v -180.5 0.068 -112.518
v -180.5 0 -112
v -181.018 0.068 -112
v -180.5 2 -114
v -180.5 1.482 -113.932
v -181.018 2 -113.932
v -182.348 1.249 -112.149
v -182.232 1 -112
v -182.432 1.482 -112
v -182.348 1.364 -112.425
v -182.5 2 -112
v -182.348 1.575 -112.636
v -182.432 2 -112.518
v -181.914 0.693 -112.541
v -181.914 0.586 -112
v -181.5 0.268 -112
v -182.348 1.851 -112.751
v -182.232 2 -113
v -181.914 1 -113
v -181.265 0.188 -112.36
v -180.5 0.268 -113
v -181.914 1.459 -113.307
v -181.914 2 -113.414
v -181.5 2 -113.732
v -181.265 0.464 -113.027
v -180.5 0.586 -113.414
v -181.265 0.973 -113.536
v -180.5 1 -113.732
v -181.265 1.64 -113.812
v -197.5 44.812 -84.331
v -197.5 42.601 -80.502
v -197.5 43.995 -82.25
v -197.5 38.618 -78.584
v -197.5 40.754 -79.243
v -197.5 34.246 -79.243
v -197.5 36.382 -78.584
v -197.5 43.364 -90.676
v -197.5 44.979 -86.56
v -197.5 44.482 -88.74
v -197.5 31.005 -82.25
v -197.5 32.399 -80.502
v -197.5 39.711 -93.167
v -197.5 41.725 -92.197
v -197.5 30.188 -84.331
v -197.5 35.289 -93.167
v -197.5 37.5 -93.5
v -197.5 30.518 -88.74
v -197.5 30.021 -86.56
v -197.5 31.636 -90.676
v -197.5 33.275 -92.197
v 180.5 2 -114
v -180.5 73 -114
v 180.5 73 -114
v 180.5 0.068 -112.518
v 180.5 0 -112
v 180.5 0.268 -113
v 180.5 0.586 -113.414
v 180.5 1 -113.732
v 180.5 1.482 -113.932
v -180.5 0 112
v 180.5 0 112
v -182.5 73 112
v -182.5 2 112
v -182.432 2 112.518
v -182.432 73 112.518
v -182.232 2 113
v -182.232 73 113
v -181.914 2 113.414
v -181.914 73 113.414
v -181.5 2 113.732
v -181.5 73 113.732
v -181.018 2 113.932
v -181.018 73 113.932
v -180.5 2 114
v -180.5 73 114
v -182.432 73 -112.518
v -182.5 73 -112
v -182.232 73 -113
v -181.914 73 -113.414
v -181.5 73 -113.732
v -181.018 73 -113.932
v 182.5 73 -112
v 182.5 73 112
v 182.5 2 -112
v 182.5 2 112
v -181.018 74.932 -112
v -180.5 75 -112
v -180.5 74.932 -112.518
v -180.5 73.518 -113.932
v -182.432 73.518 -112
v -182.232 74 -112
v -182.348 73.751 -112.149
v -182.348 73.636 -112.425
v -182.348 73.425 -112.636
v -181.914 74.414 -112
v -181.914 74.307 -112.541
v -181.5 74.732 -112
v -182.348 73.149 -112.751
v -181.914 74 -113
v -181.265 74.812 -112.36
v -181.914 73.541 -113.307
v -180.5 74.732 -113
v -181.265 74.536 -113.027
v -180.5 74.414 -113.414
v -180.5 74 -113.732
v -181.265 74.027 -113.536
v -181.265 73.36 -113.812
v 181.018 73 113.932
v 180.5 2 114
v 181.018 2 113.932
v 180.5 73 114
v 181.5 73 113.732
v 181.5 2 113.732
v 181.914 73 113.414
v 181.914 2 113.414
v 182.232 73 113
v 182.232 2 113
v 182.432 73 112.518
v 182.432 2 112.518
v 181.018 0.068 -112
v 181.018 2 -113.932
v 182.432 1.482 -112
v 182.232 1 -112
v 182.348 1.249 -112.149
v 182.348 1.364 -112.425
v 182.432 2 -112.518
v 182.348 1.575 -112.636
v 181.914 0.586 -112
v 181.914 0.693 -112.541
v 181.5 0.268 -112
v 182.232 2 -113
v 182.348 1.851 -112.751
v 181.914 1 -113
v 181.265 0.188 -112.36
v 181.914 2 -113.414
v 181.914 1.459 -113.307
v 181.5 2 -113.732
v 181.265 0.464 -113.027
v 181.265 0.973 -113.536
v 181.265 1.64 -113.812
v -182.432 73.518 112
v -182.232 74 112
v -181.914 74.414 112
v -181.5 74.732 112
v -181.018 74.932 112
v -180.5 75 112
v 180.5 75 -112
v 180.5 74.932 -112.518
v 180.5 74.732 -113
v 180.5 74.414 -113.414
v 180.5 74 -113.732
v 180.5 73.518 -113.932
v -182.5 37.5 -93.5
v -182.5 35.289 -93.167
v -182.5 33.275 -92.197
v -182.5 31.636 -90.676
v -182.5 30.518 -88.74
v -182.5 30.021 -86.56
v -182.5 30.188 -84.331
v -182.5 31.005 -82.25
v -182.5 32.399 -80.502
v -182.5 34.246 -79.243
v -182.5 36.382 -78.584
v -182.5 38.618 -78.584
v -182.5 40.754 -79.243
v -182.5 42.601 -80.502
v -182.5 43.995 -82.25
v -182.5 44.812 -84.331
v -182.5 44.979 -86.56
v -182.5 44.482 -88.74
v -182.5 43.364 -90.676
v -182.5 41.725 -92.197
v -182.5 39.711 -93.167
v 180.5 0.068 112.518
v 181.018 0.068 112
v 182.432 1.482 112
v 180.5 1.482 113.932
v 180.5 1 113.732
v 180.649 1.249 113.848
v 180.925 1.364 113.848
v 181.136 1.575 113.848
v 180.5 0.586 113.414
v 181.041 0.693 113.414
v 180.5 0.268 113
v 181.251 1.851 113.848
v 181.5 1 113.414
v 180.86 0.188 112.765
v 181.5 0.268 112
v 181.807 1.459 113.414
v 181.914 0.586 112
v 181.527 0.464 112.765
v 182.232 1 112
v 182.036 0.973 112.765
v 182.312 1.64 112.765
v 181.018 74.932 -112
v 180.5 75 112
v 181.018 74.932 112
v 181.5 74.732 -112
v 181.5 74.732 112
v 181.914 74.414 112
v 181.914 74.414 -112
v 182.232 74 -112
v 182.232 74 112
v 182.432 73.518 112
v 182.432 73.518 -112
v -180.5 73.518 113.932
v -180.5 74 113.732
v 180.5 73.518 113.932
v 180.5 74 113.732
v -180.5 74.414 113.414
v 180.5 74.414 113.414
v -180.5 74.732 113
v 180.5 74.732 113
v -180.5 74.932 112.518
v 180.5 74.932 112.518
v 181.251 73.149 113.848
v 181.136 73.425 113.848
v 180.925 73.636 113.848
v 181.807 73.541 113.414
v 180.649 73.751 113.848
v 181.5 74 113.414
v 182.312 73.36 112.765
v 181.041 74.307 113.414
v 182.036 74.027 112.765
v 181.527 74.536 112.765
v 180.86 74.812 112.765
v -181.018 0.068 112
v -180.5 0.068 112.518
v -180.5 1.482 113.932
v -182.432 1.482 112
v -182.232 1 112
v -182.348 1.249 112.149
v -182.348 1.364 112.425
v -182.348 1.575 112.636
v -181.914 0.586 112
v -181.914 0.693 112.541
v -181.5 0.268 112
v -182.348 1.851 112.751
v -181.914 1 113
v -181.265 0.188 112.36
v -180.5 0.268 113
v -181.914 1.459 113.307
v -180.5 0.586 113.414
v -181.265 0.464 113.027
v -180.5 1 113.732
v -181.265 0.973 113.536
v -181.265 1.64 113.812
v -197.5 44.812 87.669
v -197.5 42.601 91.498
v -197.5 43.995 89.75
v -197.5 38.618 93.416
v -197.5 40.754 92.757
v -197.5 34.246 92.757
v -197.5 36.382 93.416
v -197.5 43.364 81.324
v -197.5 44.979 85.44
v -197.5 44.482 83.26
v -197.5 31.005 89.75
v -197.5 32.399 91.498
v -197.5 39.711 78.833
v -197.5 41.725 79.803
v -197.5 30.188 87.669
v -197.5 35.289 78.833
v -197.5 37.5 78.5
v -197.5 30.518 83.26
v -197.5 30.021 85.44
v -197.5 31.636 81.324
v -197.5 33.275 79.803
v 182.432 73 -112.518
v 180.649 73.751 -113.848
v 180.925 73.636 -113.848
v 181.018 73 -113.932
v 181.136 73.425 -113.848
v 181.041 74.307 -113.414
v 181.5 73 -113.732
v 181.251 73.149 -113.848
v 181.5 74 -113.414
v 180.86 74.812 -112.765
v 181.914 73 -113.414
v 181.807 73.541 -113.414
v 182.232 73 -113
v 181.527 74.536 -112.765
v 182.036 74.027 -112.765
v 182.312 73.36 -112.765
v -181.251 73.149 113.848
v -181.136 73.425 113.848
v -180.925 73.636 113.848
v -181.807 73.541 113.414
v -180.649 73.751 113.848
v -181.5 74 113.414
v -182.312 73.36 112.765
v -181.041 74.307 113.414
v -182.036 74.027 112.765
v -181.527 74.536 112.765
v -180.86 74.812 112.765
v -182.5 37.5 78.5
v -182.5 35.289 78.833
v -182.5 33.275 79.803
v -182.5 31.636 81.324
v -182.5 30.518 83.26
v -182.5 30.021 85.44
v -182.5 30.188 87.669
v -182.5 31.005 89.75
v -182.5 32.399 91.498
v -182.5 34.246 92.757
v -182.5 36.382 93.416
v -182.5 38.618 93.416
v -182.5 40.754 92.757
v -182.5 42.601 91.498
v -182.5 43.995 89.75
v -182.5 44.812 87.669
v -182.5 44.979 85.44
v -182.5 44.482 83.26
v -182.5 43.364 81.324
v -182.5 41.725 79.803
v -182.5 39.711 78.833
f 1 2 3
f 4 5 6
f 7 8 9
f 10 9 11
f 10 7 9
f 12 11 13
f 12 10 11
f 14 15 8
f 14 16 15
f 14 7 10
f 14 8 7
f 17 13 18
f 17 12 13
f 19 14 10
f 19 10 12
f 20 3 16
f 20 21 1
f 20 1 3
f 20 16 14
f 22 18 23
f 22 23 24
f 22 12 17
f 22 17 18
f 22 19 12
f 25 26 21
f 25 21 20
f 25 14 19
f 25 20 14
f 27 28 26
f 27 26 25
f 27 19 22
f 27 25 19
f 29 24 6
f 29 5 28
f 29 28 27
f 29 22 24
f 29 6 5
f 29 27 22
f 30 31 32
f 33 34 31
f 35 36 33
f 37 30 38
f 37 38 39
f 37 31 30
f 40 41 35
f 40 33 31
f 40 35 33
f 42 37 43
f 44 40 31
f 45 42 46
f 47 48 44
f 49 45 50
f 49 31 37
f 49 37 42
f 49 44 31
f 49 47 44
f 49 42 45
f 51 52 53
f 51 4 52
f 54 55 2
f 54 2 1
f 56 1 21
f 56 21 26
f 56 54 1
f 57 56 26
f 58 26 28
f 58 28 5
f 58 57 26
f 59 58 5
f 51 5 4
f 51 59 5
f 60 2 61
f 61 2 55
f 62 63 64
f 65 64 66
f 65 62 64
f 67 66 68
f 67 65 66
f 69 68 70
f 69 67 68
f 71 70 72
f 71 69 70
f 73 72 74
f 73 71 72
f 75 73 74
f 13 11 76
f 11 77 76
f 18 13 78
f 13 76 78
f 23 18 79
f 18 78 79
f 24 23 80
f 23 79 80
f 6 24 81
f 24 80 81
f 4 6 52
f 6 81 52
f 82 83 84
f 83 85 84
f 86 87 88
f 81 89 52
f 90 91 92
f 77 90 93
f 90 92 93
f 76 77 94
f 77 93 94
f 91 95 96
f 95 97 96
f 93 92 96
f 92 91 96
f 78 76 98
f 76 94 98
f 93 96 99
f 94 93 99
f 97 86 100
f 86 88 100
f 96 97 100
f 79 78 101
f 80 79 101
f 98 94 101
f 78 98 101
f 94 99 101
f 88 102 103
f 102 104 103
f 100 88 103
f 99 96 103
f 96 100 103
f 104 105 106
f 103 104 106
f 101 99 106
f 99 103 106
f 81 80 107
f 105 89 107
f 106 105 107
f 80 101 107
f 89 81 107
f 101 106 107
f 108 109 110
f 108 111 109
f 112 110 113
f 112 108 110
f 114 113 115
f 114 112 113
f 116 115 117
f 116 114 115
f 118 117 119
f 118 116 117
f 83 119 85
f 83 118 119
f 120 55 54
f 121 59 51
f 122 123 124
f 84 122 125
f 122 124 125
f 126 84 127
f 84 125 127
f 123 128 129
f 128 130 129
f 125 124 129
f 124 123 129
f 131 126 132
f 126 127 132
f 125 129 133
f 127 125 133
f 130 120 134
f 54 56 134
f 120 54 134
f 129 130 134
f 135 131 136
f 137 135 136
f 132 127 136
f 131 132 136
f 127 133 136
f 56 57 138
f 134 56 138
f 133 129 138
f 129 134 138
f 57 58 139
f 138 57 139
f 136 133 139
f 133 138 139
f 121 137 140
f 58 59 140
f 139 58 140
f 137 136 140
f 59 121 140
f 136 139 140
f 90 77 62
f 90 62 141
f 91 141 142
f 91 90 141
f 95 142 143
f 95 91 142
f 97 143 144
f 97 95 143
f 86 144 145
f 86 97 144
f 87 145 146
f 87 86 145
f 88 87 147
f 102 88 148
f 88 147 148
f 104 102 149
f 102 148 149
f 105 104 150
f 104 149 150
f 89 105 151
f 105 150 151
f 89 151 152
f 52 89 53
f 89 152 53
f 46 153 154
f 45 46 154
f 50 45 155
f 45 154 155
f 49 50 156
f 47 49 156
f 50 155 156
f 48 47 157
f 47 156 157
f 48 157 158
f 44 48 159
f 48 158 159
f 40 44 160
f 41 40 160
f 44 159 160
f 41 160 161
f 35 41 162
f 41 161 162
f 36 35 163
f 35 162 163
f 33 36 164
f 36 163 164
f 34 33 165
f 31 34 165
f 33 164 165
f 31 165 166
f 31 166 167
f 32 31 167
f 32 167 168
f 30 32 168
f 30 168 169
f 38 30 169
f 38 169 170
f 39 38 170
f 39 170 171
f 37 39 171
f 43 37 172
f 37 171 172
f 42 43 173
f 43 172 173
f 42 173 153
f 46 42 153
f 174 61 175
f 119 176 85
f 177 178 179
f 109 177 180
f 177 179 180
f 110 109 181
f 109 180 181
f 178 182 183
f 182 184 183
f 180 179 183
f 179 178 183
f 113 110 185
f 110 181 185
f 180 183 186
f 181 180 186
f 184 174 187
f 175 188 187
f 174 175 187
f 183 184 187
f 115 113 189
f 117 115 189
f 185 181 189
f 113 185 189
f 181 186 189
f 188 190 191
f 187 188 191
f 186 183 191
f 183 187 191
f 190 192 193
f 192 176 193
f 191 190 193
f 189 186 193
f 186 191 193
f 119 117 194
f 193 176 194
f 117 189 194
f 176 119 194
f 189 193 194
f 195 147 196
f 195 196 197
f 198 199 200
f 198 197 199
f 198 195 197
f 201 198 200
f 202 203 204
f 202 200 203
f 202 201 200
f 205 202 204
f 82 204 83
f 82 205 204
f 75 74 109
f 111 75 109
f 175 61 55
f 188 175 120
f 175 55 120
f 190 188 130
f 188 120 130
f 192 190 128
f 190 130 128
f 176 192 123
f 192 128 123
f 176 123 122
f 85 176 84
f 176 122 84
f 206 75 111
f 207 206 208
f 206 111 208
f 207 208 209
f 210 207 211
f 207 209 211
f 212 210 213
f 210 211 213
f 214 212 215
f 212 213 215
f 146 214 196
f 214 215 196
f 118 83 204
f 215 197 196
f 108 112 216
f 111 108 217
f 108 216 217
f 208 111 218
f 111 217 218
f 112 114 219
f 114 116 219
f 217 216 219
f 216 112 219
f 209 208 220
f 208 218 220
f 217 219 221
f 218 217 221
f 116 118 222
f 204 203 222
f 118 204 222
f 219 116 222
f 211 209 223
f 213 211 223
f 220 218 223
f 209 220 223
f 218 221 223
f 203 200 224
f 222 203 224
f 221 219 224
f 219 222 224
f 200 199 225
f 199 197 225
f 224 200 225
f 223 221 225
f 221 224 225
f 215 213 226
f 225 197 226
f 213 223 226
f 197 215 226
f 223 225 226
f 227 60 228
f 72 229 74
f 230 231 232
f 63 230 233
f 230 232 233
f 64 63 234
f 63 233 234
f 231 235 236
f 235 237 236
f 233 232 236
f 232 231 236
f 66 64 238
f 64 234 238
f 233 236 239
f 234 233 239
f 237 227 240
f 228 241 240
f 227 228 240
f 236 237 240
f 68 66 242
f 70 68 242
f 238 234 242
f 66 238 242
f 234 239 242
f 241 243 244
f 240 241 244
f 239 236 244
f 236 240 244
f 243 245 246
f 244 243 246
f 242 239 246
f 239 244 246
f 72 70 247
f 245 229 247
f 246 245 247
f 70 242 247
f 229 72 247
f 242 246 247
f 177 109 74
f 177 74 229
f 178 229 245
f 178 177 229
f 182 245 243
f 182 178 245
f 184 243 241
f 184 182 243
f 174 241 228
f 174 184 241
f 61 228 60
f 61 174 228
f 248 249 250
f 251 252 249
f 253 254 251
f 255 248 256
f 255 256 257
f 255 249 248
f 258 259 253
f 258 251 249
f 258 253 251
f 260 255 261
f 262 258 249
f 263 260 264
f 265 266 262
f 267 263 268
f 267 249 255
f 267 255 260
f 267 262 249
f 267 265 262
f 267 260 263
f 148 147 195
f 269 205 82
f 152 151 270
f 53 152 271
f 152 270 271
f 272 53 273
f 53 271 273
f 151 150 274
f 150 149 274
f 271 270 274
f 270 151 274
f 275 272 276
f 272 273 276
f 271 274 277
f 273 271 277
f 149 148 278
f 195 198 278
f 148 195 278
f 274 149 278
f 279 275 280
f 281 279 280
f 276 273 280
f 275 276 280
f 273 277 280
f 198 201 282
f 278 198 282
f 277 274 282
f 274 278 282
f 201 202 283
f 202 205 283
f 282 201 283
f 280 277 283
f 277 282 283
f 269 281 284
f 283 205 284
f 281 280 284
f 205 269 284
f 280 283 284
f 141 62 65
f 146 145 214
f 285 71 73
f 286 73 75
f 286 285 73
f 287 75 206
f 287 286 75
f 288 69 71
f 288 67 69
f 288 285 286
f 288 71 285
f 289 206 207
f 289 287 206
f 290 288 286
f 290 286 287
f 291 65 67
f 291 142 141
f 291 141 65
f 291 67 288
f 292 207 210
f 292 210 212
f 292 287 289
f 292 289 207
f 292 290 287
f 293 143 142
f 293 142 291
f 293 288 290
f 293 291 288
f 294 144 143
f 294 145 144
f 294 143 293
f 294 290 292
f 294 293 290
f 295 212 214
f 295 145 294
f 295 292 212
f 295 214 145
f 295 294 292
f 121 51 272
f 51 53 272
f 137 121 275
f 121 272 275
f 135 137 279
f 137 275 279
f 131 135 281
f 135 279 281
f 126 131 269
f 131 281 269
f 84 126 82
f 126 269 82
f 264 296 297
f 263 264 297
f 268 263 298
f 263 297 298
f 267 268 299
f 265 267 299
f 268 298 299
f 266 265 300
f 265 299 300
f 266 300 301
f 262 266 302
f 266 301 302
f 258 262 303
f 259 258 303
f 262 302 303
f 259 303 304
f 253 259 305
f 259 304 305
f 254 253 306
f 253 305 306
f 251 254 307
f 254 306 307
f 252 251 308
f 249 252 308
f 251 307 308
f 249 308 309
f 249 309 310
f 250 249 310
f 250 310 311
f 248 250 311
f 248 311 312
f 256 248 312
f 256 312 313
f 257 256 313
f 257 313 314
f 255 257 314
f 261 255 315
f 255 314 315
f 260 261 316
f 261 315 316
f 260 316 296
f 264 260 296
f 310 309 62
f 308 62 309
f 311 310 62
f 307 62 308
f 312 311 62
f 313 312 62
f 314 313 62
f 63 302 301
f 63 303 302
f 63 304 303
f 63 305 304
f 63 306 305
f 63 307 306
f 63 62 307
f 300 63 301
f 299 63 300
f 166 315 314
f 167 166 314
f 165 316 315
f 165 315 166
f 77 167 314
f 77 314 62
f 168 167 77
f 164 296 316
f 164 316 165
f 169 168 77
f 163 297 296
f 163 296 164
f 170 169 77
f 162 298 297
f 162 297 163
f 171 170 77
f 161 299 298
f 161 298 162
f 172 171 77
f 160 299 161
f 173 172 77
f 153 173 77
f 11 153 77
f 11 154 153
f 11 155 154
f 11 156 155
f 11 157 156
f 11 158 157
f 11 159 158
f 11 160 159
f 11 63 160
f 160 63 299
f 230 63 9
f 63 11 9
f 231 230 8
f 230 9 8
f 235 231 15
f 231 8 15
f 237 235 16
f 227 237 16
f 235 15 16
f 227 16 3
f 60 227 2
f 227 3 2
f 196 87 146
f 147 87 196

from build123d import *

# Parameters (mm, degrees)
SKETCH_1_W      = 365
SKETCH_1_H      = 228
EXTRUDE_1_DEPTH = 75
SKETCH_2_R      = 7.5
EXTRUDE_2_DEPTH = 15
FILLET_1_R      = 2


with BuildPart() as part:
    # 草图1 → 凸台-拉伸1 (new body)
    with BuildSketch(Plane(origin=(0, 0, 0), x_dir=(1, 0, 0), z_dir=(0, 1, 0))):
        Rectangle(SKETCH_1_W, SKETCH_1_H)
    extrude(amount=EXTRUDE_1_DEPTH)

    # 草图2 → 凸台-拉伸2 (add)
    with BuildSketch(Plane.ZY.offset(182.5)):
        with Locations(Location((-86, 37.5, 0), (0, 0, 180))):
            Circle(SKETCH_2_R)
        with Locations(Location((86, 37.5, 0), (0, 0, 180))):
            Circle(SKETCH_2_R)
    extrude(amount=EXTRUDE_2_DEPTH)

    # 圆角1
    fillet_1_edges = [part.edges().sort_by_distance(p)[0] for p in [
        (182.5, 75, 0),
        (0, 75, -114),
        (-182.5, 75, 0),
        (0, 0, -114),
        (182.5, 0, 0),
        (0, 0, 114),
        (-182.5, 0, 0),
        (-182.5, 37.5, -114),
        (182.5, 37.5, -114),
        (182.5, 37.5, 114),
        (-182.5, 37.5, 114),
        (0, 75, 114),
    ]]
    fillet(fillet_1_edges, radius=FILLET_1_R)


solid = part.part
